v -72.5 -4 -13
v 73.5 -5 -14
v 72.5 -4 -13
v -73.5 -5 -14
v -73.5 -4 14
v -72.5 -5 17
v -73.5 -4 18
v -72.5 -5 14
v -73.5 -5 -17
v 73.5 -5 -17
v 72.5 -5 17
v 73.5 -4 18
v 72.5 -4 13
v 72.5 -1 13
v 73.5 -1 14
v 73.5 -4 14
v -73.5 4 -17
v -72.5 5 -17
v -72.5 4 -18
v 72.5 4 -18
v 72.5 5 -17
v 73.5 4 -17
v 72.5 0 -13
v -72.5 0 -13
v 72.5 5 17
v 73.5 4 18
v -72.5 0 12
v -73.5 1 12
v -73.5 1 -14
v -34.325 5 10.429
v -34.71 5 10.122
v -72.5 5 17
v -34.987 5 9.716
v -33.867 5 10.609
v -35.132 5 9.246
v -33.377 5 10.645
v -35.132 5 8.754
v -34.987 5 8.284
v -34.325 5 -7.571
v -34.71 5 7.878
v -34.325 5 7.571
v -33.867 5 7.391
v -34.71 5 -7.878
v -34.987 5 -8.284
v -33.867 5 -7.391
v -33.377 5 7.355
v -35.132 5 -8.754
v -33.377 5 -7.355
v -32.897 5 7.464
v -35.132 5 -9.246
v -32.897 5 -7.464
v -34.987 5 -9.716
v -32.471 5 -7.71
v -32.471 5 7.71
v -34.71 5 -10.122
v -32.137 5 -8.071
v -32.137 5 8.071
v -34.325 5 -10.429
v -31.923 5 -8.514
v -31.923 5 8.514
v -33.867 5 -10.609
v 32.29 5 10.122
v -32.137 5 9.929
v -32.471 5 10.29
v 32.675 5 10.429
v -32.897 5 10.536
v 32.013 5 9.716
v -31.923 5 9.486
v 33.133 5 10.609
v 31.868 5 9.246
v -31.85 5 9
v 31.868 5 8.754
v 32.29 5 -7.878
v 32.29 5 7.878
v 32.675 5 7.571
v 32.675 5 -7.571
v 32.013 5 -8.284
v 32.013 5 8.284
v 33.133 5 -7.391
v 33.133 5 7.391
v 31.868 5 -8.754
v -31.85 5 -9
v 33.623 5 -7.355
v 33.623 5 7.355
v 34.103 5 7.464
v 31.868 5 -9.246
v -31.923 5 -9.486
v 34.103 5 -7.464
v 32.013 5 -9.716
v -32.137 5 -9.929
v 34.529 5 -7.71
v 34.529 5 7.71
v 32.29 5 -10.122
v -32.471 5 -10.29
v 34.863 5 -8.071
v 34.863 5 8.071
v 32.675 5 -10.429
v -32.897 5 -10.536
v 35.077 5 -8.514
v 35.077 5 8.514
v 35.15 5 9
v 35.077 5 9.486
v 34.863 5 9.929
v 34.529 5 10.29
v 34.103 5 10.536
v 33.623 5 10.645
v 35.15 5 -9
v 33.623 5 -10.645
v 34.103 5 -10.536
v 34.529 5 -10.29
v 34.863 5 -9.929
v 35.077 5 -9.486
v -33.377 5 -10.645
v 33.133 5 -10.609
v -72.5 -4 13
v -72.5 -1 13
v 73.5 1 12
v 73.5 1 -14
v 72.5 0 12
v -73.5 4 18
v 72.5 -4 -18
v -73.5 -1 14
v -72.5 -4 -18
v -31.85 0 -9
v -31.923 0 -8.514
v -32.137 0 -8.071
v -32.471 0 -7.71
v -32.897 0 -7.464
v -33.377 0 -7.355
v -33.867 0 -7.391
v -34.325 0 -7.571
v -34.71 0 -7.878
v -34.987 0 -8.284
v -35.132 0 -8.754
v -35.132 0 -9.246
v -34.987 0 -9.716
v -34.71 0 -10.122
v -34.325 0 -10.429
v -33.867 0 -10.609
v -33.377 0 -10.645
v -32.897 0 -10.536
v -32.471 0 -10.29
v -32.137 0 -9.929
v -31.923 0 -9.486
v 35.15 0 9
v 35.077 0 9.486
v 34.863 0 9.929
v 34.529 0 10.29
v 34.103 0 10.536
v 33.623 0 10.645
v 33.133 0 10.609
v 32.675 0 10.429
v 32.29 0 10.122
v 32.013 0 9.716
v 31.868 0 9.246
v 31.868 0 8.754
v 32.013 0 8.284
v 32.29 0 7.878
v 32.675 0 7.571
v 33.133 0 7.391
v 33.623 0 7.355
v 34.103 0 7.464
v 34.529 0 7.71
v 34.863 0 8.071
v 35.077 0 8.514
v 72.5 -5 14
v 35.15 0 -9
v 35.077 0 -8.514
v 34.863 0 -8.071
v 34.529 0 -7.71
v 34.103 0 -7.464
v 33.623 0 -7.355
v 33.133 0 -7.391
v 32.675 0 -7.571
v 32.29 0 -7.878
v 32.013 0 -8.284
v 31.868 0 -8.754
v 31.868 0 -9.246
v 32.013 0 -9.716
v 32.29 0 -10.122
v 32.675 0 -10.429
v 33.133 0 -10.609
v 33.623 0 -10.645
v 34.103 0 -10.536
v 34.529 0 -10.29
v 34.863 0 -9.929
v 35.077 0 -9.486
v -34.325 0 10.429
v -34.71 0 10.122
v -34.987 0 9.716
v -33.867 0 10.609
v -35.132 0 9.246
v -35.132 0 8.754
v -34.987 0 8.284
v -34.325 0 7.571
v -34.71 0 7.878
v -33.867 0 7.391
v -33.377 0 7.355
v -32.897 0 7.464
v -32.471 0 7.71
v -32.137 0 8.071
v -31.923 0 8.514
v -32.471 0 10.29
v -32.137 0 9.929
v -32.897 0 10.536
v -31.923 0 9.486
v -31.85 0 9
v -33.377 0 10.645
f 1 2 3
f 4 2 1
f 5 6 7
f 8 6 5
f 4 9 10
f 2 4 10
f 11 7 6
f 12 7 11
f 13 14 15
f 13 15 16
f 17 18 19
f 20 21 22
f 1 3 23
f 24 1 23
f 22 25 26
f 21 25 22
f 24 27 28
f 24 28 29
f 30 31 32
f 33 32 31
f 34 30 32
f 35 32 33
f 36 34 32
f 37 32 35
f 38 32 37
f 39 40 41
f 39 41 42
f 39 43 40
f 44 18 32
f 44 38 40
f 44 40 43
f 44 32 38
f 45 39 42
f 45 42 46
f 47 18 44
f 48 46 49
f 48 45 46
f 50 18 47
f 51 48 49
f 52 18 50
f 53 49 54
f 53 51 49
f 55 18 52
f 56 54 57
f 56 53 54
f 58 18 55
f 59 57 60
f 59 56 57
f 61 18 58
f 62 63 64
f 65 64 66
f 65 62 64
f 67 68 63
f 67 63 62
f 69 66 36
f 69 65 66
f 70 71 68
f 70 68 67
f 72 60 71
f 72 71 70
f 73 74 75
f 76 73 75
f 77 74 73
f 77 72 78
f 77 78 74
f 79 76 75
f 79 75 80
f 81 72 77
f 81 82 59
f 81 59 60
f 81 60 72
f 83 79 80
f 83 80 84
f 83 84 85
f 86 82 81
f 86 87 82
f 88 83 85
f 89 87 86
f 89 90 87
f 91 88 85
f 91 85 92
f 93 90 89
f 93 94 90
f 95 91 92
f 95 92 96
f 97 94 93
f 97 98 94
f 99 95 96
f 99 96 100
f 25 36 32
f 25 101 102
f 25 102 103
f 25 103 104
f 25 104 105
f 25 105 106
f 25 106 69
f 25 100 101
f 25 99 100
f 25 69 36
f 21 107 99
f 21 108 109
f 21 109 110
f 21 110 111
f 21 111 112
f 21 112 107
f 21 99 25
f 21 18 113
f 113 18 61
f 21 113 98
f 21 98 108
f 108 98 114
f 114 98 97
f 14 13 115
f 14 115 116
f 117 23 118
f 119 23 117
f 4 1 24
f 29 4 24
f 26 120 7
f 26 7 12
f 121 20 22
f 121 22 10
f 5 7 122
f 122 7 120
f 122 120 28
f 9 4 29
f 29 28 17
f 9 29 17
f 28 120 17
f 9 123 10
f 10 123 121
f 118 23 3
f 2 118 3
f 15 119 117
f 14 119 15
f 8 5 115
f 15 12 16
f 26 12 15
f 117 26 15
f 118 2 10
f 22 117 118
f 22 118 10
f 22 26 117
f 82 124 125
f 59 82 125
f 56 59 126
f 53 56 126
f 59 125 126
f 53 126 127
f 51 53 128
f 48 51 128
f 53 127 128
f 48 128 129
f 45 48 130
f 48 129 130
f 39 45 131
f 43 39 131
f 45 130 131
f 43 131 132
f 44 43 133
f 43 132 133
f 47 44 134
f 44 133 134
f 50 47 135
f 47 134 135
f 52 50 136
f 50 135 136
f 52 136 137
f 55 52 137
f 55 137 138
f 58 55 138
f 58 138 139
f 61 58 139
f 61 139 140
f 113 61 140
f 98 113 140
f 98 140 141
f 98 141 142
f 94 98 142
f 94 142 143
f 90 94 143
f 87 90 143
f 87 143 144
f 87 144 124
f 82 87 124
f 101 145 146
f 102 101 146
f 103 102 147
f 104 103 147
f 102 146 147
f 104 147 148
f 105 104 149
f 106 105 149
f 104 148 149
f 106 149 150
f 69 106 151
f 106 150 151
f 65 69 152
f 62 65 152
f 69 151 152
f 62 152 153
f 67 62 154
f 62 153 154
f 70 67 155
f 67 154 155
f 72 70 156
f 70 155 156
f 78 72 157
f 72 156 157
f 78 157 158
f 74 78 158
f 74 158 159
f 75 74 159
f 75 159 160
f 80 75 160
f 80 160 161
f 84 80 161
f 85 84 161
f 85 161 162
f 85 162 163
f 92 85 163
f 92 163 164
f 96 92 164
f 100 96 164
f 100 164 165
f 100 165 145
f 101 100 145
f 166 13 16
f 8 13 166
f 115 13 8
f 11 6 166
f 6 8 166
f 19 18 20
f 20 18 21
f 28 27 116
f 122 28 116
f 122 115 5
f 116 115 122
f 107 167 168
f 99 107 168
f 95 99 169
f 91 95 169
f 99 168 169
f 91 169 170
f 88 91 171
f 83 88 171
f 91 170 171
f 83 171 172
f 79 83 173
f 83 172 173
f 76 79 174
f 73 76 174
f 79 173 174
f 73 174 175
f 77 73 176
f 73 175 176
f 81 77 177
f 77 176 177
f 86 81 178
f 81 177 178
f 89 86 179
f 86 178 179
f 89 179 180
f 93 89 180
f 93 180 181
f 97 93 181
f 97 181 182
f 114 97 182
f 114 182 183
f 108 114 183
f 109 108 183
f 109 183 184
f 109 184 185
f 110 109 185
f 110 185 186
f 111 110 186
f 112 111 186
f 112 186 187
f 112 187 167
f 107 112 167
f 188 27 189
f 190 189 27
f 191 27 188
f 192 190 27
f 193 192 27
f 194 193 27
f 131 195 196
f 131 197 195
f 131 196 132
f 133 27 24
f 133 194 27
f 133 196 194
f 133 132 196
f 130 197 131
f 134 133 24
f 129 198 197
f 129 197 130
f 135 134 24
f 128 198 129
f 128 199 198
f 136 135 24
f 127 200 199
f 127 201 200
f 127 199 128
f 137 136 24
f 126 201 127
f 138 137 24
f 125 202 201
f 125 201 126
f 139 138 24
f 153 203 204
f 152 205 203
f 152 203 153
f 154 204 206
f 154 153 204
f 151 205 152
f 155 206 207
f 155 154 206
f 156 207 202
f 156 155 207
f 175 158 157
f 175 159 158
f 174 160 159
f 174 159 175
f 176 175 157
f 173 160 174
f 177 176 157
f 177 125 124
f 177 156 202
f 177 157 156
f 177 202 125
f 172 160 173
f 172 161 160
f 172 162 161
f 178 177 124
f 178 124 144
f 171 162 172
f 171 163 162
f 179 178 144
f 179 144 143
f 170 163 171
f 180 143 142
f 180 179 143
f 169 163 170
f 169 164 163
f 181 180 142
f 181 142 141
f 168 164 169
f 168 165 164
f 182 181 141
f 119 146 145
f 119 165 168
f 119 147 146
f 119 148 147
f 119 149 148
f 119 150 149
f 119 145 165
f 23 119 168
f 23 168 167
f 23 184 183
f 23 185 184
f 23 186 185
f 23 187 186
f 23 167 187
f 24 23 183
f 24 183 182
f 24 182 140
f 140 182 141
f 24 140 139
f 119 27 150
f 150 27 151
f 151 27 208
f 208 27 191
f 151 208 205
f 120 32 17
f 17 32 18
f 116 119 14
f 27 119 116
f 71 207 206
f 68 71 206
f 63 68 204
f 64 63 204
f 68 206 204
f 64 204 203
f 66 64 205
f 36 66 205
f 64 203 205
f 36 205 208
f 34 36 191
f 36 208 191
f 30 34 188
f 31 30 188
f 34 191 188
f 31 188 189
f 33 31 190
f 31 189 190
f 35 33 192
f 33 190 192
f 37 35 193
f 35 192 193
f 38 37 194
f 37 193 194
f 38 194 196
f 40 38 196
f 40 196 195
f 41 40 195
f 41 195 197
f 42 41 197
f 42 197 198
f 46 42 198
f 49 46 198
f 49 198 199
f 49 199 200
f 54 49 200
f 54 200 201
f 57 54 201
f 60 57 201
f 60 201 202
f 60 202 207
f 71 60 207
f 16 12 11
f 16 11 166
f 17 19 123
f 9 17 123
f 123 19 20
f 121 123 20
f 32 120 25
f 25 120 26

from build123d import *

# Parameters (mm, degrees)
SKETCH1_W                       = 147
SKETCH1_H                       = 36
BOSS_EXTRUDE1_DEPTH             = 5
SKETCH2_W                       = 26
SKETCH2_H                       = 5
CUT_EXTRUDE1_DEPTH              = 74.5
CUT_EXTRUDE1_DEPTH_BACK         = 74.5
CHAMFER1_SIZE                   = 1
TAP_DRILL_FOR_M4X0_7_TAP1_D     = 3.3
TAP_DRILL_FOR_M4X0_7_TAP1_DEPTH = 14
TAP_DRILL_FOR_M4X0_7_TAP1_TIP   = 0.991420021


with BuildPart() as part:
    # Sketch1 → Boss-Extrude1 (new body, symmetric)
    with BuildSketch(Plane(origin=(0, 0, 0), x_dir=(1, 0, 0), z_dir=(0, 1, 0))):
        Rectangle(SKETCH1_W, SKETCH1_H)
    extrude(amount=BOSS_EXTRUDE1_DEPTH, both=True)

    # Sketch2 → Cut-Extrude1 (cut, two sides)
    with BuildSketch(Plane(origin=(0, 0, 0), x_dir=(0, 0, -1), z_dir=(1, 0, 0))) as cut_extrude1_sk:
        with Locations((0, -2.5)):
            Rectangle(SKETCH2_W, SKETCH2_H)
    extrude(amount=CUT_EXTRUDE1_DEPTH, mode=Mode.SUBTRACT)
    extrude(cut_extrude1_sk.sketch, amount=-CUT_EXTRUDE1_DEPTH_BACK, mode=Mode.SUBTRACT)

    # Chamfer1
    chamfer1_edges = [part.edges().sort_by_distance(p)[0] for p in [
        (73.5, -2.5, 13),
        (0, -5, 18),
        (0, 0, 13),
        (73.5, 0, 0),
        (73.5, -2.5, -13),
        (0, -5, -13),
        (-73.5, -2.5, -13),
        (-73.5, 0, 0),
        (-73.5, -2.5, 13),
        (-73.5, -5, 15.5),
        (0, -5, 13),
        (73.5, -5, 15.5),
        (0, 5, 18),
        (-73.5, 5, 0),
        (73.5, 5, 0),
        (0, 5, -18),
        (73.5, 0, -18),
        (0, -5, -18),
        (-73.5, 0, -18),
    ]]
    chamfer(chamfer1_edges, length=CHAMFER1_SIZE)

    # Tap Drill for M4x0.7 Tap1
    with Locations(Plane(origin=(-88.5, 5, -18), x_dir=(-1, 0, 0), z_dir=(0, 1, 0))):
        with Locations((-55, 27), (-122, 27), (-55, 9), (-122, 9)):
            Hole(TAP_DRILL_FOR_M4X0_7_TAP1_D / 2, depth=TAP_DRILL_FOR_M4X0_7_TAP1_DEPTH)
            with Locations((0, 0, -(TAP_DRILL_FOR_M4X0_7_TAP1_DEPTH + TAP_DRILL_FOR_M4X0_7_TAP1_TIP / 2))):  # 118° drill point
                Cone(0, TAP_DRILL_FOR_M4X0_7_TAP1_D / 2, TAP_DRILL_FOR_M4X0_7_TAP1_TIP, mode=Mode.SUBTRACT)


solid = part.part
